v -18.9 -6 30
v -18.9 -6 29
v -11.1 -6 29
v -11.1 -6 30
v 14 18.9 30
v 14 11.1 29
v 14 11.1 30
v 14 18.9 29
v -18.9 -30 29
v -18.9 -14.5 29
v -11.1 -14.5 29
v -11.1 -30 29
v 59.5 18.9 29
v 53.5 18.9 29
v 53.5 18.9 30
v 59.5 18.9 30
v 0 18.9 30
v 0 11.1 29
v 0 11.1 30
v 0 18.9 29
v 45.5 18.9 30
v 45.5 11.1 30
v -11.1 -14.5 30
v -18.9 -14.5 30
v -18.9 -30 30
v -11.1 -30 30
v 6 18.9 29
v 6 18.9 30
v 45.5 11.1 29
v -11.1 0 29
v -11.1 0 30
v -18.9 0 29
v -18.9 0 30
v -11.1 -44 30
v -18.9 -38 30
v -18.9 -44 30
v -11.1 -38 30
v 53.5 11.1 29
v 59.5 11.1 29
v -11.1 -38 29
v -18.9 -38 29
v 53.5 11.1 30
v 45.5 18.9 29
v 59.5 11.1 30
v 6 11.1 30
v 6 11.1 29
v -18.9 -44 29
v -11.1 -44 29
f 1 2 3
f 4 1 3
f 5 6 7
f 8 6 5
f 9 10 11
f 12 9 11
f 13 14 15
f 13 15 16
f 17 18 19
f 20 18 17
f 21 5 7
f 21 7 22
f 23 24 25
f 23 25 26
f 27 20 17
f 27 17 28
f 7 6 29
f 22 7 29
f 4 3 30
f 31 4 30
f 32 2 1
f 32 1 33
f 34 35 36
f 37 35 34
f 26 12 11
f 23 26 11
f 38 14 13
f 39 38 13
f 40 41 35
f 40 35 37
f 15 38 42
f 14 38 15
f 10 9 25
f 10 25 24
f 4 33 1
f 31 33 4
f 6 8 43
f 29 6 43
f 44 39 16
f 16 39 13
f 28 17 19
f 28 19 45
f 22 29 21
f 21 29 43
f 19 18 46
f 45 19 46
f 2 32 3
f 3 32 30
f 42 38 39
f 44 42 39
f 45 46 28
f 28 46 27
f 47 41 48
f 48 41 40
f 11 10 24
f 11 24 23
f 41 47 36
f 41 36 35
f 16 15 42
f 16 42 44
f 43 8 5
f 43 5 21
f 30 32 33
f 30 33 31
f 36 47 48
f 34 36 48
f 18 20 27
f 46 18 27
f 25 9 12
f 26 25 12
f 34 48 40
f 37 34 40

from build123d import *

# Parameters (mm, degrees)
BOX007_W     = 7.8
BOX007_H     = 6
BOX007_DEPTH = 1
BOX006_W     = 7.8
BOX006_H     = 6
BOX006_DEPTH = 1
BOX005_W     = 31.5
BOX005_H     = 7.8
BOX005_DEPTH = 1
BOX004_W     = 6
BOX004_H     = 7.8
BOX004_DEPTH = 1
BOX003_W     = 6
BOX003_H     = 7.8
BOX003_DEPTH = 1
BOX008_W     = 7.8
BOX008_H     = 15.5
BOX008_DEPTH = 1


with BuildPart() as cube007:
    # Box007 → Box007 (new body)
    with BuildSketch(Plane(origin=(-18.9, -44, 29), x_dir=(1, 0, 0), z_dir=(0, 0, 1))):
        with Locations((3.9, 3)):
            Rectangle(BOX007_W, BOX007_H)
    extrude(amount=BOX007_DEPTH)


with BuildPart() as cube006:
    # Box006 → Box006 (new body)
    with BuildSketch(Plane(origin=(-18.9, -6, 29), x_dir=(1, 0, 0), z_dir=(0, 0, 1))):
        with Locations((3.9, 3)):
            Rectangle(BOX006_W, BOX006_H)
    extrude(amount=BOX006_DEPTH)


with BuildPart() as cube005:
    # Box005 → Box005 (new body)
    with BuildSketch(Plane(origin=(14, 11.1, 29), x_dir=(1, 0, 0), z_dir=(0, 0, 1))):
        with Locations((15.75, 3.9)):
            Rectangle(BOX005_W, BOX005_H)
    extrude(amount=BOX005_DEPTH)


with BuildPart() as cube004:
    # Box004 → Box004 (new body)
    with BuildSketch(Plane(origin=(53.5, 11.1, 29), x_dir=(1, 0, 0), z_dir=(0, 0, 1))):
        with Locations((3, 3.9)):
            Rectangle(BOX004_W, BOX004_H)
    extrude(amount=BOX004_DEPTH)


with BuildPart() as cube003:
    # Box003 → Box003 (new body)
    with BuildSketch(Plane(origin=(0, 11.1, 29), x_dir=(1, 0, 0), z_dir=(0, 0, 1))):
        with Locations((3, 3.9)):
            Rectangle(BOX003_W, BOX003_H)
    extrude(amount=BOX003_DEPTH)


with BuildPart() as mounting_tab:
    # Box008 → Box008 (new body)
    with BuildSketch(Plane(origin=(-18.9, -30, 29), x_dir=(1, 0, 0), z_dir=(0, 0, 1))):
        with Locations((3.9, 7.75)):
            Rectangle(BOX008_W, BOX008_H)
    extrude(amount=BOX008_DEPTH)

    # Fusion006002011004053036004001003: union Cube007, Cube006, Cube005, Cube004, Cube003
    add(cube007.part)
    add(cube006.part)
    add(cube005.part)
    add(cube004.part)
    add(cube003.part)


solid = mounting_tab.part
